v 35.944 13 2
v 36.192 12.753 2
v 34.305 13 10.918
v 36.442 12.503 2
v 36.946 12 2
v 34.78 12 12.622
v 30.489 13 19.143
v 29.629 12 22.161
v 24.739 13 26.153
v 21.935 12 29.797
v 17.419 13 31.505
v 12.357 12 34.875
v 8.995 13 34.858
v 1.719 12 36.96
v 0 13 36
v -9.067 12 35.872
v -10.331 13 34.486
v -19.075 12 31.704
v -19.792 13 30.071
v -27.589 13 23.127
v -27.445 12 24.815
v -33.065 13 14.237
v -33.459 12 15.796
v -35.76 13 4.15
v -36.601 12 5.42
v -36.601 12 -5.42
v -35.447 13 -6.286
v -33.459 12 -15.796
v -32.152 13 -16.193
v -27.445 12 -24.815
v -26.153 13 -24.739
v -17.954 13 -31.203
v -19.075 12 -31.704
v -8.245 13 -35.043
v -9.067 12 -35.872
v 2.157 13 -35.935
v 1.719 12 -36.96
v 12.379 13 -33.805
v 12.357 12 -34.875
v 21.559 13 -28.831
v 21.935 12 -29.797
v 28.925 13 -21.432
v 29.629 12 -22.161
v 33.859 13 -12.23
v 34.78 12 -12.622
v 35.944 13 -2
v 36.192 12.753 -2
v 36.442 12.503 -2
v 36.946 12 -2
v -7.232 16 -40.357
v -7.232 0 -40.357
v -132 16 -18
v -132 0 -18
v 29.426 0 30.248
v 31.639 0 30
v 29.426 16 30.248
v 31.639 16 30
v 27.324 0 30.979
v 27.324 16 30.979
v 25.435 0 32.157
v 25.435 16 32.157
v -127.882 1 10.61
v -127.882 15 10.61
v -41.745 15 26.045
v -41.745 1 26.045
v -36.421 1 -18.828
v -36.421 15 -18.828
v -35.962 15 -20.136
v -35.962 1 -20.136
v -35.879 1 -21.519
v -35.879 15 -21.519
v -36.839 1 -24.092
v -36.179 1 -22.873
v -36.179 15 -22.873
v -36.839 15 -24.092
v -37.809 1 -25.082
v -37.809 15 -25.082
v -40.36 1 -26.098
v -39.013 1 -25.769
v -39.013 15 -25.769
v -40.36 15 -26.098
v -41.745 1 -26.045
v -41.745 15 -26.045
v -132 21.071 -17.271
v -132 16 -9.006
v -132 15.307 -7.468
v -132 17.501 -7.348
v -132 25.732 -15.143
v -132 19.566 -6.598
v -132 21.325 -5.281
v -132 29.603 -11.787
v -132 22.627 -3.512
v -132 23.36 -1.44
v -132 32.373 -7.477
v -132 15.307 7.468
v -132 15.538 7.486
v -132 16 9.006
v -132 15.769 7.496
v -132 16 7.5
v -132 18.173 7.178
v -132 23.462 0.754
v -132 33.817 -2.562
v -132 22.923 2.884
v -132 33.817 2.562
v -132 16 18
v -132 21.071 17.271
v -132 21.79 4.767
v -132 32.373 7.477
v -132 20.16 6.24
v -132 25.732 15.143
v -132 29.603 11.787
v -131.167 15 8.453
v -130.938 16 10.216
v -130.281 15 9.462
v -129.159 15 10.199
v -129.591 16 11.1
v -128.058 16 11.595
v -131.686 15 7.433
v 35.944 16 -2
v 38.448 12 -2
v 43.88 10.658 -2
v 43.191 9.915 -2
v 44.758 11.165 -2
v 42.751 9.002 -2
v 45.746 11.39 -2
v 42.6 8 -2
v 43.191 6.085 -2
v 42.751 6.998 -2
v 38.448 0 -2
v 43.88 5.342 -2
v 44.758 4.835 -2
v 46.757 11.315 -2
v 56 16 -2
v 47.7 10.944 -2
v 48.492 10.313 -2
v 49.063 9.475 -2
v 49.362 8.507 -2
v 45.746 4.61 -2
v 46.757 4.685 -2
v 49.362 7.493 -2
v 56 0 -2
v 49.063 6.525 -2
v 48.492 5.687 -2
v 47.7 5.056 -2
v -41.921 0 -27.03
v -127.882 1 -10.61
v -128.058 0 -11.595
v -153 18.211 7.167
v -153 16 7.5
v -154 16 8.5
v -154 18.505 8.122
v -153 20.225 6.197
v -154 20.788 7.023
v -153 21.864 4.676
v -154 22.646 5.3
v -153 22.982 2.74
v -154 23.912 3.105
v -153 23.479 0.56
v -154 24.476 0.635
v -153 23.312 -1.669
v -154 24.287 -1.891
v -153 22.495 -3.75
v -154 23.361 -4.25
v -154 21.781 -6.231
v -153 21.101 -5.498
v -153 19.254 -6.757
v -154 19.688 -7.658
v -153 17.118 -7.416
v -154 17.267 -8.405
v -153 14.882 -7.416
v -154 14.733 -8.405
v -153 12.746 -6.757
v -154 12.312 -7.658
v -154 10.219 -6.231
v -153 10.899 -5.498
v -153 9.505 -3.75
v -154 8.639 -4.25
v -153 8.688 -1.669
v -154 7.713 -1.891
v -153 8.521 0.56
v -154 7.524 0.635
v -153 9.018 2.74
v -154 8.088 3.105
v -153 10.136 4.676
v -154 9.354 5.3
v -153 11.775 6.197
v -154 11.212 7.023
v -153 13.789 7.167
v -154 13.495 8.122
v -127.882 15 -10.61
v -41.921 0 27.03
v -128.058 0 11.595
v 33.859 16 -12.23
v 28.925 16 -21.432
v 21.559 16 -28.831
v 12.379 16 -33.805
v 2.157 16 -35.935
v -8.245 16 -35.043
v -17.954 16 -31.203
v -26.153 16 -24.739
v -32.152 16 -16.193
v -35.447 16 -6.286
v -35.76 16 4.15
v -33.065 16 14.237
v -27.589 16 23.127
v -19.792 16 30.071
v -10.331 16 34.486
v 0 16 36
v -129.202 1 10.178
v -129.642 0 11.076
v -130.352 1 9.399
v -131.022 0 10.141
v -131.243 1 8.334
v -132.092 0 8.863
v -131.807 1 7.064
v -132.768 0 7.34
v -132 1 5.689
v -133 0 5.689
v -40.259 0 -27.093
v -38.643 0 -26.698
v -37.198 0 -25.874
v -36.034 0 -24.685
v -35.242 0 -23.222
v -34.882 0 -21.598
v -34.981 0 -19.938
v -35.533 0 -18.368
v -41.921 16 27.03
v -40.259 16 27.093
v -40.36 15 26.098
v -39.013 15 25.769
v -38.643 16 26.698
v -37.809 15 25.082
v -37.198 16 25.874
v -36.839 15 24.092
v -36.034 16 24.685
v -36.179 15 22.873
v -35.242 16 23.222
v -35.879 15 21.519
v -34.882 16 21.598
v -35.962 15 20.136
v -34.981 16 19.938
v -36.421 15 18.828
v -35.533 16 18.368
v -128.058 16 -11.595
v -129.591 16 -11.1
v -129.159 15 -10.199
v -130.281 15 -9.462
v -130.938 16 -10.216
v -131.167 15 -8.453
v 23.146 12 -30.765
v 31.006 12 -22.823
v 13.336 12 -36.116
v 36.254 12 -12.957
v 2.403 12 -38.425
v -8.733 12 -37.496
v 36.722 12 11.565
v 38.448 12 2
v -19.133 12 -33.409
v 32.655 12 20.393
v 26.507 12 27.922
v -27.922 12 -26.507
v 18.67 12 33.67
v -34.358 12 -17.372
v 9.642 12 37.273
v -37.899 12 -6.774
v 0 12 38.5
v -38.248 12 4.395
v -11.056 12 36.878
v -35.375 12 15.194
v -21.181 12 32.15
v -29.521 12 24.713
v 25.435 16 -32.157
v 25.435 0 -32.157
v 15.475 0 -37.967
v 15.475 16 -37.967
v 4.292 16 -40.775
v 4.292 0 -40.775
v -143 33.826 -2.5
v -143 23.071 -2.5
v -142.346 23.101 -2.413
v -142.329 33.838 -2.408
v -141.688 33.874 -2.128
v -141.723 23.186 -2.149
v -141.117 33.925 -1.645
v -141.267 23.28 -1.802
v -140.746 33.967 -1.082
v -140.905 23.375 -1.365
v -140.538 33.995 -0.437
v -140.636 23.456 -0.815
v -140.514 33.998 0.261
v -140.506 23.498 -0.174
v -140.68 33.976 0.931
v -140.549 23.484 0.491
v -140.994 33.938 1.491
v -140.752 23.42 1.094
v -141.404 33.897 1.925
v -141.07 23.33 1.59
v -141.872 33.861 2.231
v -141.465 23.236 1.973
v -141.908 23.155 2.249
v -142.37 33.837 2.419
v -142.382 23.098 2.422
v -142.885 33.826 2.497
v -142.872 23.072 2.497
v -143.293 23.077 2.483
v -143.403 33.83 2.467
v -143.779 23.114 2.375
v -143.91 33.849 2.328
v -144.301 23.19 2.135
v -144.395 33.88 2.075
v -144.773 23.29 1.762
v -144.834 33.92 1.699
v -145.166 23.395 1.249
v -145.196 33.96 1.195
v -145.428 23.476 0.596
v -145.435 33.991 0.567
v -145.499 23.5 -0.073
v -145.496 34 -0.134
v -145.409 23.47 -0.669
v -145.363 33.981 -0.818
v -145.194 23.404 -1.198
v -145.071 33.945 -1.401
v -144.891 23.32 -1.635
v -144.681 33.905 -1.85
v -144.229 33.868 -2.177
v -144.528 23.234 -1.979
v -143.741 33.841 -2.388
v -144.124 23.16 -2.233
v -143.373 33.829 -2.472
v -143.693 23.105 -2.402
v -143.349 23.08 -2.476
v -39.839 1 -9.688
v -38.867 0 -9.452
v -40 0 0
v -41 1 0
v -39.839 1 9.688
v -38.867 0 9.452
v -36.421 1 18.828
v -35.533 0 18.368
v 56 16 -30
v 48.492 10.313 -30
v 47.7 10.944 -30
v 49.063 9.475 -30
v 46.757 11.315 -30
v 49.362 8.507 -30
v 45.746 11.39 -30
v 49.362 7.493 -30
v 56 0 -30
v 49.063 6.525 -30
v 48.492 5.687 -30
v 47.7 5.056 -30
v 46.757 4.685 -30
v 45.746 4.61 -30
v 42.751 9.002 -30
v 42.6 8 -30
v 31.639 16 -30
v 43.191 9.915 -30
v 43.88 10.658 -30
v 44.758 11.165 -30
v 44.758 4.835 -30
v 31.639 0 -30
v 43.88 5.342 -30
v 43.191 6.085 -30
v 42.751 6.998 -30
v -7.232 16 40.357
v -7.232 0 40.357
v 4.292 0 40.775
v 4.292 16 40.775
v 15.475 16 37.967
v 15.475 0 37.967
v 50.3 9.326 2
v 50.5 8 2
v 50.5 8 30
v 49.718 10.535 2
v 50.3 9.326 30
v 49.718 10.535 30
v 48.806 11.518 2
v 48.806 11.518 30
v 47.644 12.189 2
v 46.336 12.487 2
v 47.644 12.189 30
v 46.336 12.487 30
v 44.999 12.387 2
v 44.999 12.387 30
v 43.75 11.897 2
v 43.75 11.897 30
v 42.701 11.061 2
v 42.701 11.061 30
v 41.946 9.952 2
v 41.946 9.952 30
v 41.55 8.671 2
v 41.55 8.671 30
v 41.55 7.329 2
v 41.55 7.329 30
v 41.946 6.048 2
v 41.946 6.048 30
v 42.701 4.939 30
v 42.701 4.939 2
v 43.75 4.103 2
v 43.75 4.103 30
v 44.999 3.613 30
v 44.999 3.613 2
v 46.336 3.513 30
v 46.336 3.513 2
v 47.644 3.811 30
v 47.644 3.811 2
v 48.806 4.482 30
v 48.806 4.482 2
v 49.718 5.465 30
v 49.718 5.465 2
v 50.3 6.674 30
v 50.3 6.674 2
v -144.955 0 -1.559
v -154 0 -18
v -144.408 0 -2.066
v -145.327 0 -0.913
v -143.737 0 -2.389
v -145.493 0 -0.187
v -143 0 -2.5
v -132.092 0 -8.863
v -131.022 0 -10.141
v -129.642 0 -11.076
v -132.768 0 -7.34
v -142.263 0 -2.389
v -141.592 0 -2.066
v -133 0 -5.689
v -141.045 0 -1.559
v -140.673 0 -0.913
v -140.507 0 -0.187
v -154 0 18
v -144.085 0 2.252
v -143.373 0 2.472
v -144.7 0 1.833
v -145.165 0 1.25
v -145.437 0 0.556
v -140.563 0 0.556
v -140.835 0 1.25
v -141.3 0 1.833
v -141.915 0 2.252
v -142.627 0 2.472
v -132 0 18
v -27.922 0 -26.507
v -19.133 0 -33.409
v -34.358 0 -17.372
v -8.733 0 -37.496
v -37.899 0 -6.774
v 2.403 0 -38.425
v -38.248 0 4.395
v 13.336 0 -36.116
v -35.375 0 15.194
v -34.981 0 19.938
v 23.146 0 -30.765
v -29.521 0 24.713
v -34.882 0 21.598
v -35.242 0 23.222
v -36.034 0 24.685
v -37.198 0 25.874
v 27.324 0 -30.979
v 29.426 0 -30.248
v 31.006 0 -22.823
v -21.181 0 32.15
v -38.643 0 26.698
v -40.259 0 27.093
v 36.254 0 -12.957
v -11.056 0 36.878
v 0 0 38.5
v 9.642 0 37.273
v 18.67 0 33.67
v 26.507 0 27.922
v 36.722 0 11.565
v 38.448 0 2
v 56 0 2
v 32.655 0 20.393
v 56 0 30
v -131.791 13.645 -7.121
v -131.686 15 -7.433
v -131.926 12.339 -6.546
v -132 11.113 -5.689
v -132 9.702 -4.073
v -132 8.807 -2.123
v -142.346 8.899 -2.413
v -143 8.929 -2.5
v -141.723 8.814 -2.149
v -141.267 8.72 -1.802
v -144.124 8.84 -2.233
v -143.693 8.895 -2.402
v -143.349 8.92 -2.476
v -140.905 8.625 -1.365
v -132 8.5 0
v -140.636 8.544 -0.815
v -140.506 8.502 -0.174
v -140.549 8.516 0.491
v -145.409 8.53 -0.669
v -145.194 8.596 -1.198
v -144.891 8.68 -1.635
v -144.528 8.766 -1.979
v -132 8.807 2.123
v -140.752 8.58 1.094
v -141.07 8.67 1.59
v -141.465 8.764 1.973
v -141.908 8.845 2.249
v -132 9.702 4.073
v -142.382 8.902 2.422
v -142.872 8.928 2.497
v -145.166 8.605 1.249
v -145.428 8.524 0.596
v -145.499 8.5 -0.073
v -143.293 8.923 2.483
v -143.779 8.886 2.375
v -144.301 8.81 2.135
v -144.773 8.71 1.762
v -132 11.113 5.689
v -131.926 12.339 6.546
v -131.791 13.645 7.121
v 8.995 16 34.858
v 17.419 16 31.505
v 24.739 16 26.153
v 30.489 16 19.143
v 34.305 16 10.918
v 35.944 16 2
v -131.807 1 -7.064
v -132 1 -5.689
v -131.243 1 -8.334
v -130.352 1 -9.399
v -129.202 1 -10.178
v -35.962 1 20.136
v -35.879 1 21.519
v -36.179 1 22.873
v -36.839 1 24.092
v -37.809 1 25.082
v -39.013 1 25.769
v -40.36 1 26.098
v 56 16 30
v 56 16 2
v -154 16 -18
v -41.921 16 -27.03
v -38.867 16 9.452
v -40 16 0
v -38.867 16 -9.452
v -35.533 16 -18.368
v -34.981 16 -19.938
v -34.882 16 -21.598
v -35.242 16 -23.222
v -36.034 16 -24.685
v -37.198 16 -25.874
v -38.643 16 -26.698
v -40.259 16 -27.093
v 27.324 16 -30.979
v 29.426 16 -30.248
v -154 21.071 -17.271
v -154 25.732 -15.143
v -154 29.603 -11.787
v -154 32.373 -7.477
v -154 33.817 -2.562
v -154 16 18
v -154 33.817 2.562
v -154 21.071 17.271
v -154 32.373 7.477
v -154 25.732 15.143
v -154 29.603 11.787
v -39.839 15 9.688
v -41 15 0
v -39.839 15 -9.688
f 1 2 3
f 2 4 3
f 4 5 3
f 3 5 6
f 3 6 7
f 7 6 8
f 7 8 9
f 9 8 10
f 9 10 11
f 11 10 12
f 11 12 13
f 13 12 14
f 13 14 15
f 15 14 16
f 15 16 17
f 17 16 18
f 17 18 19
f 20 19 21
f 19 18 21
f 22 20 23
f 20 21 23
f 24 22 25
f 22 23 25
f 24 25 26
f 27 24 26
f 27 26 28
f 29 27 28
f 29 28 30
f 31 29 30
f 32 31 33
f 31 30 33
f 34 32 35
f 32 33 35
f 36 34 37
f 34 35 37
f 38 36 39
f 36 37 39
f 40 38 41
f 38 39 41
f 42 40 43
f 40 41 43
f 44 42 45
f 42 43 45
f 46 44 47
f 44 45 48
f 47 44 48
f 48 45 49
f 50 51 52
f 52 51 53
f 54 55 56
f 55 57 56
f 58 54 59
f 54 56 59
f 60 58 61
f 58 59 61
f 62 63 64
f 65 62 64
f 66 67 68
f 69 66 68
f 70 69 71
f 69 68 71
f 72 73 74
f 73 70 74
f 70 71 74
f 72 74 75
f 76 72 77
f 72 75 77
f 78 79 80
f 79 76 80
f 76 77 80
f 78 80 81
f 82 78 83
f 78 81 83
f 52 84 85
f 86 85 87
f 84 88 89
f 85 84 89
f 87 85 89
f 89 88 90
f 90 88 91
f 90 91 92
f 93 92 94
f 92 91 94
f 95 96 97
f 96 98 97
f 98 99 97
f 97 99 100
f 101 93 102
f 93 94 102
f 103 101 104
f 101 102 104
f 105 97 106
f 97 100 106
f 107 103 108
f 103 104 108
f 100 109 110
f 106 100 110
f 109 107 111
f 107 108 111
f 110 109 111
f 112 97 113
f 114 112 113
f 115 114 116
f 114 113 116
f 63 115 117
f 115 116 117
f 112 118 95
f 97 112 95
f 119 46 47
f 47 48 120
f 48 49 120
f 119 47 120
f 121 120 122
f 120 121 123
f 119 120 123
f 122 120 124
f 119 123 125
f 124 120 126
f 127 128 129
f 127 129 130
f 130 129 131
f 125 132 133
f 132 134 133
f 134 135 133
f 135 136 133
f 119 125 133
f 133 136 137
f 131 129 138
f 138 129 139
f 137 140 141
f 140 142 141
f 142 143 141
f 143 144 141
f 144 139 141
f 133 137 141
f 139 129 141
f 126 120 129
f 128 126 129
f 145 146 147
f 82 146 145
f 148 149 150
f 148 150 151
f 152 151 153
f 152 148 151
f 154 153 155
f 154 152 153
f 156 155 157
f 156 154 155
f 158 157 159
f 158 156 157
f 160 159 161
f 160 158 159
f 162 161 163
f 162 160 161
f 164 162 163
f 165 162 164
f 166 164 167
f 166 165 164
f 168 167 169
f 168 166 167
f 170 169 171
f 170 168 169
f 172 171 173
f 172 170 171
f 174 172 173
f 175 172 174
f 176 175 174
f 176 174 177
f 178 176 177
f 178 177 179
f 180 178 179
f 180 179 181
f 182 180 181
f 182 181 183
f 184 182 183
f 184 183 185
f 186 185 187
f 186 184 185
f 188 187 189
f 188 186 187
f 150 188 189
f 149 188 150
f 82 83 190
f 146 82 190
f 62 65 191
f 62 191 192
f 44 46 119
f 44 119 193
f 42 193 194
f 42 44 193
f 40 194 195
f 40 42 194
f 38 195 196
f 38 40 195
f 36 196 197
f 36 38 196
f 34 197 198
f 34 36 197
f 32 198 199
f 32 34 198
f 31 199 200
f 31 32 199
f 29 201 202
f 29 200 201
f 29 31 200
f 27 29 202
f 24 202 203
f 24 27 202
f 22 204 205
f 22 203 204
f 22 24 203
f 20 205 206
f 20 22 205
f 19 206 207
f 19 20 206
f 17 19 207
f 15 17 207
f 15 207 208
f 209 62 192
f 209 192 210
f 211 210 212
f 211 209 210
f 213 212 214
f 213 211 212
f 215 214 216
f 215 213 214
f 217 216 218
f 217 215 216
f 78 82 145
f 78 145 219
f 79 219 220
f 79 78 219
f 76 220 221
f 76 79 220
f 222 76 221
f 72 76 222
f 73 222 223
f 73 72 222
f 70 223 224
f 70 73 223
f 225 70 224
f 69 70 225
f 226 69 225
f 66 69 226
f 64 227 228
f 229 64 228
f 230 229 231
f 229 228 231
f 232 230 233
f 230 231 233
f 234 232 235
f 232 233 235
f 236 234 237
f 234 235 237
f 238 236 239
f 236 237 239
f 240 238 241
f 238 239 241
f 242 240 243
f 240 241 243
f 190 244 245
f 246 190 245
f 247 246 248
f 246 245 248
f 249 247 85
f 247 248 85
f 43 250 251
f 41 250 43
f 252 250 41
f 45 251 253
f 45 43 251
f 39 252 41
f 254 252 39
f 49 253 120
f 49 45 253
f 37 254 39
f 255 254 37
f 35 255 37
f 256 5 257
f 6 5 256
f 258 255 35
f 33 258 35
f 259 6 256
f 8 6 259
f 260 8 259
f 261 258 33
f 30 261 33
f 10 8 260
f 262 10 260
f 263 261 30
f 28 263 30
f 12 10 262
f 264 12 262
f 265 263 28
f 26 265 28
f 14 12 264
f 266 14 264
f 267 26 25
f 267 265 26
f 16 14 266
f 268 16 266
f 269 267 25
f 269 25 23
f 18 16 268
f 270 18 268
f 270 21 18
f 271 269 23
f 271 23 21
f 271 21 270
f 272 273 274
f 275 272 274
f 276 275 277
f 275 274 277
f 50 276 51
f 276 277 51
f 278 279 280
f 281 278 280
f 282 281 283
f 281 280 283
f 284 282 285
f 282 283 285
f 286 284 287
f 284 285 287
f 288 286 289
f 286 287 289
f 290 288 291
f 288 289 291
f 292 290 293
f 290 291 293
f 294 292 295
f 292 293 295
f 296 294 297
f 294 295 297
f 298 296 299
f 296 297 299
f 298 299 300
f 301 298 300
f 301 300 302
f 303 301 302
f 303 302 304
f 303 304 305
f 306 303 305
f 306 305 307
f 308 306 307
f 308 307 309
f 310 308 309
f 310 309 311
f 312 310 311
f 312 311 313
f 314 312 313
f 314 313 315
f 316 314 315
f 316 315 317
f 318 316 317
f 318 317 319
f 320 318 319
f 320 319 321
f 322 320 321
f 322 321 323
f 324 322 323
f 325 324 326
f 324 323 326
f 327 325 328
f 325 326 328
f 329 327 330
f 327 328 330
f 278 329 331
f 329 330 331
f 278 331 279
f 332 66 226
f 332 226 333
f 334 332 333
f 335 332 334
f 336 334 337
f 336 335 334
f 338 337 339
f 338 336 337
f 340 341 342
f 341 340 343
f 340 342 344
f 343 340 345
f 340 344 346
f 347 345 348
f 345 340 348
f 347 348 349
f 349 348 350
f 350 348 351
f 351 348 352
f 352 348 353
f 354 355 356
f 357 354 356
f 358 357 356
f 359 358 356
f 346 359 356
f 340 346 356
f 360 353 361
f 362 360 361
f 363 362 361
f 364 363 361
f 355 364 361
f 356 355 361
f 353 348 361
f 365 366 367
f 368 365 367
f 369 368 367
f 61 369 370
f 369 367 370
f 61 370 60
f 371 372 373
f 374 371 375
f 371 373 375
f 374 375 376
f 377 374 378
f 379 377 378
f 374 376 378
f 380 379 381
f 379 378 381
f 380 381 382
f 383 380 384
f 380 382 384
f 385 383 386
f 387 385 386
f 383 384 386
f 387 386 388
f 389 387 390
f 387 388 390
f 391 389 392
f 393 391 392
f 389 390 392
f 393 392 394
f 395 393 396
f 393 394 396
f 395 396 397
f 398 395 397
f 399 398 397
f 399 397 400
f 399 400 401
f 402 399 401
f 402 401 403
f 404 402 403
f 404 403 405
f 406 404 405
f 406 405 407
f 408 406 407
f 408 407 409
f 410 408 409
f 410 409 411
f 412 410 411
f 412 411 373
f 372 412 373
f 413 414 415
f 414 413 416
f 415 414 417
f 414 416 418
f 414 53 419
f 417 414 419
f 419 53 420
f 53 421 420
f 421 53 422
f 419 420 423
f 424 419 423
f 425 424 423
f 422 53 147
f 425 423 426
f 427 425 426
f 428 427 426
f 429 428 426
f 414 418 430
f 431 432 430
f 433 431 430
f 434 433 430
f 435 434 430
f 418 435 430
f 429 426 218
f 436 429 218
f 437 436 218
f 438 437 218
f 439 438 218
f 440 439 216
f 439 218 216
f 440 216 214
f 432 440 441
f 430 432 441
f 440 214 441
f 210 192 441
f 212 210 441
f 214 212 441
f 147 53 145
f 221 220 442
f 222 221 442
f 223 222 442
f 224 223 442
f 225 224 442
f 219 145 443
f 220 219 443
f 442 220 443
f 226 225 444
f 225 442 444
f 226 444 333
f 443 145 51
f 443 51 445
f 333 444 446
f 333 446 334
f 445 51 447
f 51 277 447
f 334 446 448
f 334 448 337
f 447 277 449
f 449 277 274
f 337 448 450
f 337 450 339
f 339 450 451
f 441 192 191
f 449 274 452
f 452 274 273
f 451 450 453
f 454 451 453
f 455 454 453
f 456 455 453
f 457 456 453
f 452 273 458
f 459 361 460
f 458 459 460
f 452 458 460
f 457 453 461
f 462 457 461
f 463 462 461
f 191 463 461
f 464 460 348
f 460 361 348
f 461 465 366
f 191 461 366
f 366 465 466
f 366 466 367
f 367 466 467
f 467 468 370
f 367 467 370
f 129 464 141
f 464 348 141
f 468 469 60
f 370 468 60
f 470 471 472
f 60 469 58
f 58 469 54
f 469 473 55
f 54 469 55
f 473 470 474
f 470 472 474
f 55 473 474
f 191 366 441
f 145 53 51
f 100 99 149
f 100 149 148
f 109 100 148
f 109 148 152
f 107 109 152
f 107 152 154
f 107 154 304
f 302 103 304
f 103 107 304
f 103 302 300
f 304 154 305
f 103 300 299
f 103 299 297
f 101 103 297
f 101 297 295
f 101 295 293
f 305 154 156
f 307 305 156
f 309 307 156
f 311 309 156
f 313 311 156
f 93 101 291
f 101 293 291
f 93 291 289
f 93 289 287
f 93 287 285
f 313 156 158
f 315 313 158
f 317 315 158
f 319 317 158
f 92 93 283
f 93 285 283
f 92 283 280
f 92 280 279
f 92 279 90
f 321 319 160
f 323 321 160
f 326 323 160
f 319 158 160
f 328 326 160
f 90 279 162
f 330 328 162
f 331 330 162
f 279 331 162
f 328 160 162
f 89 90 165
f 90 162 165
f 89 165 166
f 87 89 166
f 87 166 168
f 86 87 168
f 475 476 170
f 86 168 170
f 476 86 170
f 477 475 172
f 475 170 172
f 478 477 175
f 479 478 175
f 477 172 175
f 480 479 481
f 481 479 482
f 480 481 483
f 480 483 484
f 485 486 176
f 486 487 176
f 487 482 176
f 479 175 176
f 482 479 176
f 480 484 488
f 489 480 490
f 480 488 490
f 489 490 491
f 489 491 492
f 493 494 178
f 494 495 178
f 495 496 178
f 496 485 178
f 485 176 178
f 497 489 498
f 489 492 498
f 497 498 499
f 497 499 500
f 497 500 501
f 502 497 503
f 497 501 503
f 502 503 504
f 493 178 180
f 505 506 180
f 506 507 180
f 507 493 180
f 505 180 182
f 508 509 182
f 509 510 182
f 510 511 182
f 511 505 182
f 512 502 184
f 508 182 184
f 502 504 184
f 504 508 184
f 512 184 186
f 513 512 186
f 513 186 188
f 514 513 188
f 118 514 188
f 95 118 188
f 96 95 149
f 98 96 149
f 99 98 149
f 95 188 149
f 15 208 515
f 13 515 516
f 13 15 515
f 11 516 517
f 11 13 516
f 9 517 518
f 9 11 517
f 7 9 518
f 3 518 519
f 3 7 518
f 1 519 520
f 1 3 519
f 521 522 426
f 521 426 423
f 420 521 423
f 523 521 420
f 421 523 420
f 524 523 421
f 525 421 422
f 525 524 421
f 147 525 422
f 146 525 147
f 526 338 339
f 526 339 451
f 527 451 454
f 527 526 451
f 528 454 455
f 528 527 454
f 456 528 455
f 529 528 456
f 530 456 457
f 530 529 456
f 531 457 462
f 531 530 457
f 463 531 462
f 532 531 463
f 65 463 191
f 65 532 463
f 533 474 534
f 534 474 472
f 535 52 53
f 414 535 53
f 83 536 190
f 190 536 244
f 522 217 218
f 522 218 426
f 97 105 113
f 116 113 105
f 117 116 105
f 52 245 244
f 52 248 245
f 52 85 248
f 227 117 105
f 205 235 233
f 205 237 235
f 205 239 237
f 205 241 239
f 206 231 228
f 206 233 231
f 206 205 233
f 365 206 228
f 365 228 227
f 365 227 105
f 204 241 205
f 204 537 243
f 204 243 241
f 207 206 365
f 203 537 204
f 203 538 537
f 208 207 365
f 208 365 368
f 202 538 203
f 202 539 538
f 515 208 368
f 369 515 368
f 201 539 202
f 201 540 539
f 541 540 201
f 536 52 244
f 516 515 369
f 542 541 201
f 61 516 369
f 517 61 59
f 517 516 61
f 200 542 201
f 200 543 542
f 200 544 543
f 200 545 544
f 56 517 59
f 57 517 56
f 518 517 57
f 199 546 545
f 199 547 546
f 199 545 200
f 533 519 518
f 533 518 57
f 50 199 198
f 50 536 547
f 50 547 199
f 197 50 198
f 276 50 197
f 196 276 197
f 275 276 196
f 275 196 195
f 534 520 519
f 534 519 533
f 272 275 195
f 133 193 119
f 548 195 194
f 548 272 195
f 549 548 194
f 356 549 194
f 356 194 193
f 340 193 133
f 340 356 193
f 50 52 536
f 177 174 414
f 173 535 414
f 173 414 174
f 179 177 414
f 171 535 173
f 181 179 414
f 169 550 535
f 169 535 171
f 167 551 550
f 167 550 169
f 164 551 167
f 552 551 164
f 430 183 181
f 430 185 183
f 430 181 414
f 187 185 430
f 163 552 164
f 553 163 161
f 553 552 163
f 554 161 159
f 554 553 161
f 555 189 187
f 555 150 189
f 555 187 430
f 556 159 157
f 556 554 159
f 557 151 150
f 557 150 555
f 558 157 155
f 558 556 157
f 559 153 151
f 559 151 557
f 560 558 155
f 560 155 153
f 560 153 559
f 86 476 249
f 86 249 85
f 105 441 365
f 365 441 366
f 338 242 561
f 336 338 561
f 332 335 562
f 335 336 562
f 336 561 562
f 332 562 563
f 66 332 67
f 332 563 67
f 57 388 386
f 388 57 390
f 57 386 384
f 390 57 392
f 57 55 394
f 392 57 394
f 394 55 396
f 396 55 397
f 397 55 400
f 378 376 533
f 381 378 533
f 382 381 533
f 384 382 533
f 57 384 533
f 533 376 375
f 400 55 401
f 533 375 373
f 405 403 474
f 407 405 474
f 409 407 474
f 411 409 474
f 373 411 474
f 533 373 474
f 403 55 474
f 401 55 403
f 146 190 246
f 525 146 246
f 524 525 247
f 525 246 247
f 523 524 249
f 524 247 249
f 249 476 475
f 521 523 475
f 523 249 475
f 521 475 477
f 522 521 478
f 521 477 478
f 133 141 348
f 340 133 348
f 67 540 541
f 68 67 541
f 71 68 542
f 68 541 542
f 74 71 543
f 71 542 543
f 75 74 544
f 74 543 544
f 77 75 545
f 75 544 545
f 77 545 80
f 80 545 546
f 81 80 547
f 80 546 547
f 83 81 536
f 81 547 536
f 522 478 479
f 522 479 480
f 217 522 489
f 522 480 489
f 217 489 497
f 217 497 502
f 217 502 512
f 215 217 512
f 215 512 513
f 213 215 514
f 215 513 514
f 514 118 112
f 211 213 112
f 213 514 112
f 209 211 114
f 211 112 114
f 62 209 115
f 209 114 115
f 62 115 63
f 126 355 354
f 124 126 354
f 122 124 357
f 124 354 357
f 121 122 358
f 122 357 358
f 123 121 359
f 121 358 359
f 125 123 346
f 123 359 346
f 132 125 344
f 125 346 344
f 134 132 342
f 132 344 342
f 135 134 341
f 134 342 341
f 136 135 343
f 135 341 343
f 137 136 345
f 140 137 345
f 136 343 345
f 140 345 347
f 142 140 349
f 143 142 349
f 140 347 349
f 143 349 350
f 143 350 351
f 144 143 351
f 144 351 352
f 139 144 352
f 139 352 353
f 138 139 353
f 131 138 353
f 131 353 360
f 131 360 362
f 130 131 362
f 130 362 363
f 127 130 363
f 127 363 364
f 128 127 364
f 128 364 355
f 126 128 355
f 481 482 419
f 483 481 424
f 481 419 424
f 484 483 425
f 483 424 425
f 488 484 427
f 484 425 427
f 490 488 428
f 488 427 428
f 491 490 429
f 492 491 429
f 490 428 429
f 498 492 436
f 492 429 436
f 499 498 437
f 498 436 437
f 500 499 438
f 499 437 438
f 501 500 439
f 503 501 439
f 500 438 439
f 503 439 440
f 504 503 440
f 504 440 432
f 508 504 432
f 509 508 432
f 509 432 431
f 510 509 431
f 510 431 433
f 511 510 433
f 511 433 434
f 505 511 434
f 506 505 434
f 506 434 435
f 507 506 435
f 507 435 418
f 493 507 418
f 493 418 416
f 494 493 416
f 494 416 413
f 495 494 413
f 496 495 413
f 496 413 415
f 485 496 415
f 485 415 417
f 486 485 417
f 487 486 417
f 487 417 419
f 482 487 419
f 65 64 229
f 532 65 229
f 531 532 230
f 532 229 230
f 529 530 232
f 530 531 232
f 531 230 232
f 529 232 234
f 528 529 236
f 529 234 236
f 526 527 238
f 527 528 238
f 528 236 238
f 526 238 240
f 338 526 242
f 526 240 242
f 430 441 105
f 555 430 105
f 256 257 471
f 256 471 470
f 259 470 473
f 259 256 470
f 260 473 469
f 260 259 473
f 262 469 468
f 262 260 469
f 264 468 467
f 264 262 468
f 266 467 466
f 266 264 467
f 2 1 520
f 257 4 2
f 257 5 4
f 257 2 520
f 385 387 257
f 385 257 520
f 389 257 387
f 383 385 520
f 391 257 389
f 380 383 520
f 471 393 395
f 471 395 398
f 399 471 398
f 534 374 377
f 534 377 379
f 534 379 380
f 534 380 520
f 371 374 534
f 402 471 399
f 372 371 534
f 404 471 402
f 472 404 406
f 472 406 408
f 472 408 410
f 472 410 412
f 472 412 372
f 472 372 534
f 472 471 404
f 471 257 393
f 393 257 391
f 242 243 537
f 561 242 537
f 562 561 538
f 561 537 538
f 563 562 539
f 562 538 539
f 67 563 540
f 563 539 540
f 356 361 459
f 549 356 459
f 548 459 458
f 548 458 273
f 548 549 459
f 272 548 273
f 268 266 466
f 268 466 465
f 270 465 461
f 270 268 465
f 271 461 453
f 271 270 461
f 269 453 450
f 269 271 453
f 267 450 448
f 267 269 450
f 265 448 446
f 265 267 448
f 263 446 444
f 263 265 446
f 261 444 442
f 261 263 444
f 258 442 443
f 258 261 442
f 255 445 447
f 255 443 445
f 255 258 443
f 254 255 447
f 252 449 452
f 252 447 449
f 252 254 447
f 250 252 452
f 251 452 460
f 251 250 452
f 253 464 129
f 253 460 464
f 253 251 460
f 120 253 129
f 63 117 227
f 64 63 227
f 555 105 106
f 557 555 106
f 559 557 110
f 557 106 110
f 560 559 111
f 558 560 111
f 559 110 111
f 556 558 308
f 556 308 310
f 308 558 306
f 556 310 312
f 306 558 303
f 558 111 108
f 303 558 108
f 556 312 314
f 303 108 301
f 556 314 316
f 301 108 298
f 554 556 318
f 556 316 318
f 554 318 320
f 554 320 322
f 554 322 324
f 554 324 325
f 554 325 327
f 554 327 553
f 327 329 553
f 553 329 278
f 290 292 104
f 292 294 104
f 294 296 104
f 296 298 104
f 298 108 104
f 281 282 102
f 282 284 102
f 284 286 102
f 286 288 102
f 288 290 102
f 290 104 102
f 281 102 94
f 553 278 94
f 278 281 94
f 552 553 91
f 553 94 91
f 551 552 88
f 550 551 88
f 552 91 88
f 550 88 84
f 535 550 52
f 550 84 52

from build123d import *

# Parameters (mm, degrees)
EXTRUDE_1_DEPTH            = 16
CUT_EXTRUDE_1_DEPTH        = 140.143810498
CUT_EXTRUDE_1_DEPTH_BACK   = 140.143810498
SKETCH_2_R                 = 36
CUT_EXTRUDE_2_DEPTH        = 140.143810498
CUT_EXTRUDE_2_DEPTH_BACK   = 12
SKETCH_3_R                 = 38.5
CUT_EXTRUDE_1_2_DEPTH      = 140.143810498
CUT_EXTRUDE_1_2_DEPTH_BACK = 140.143810498
SKETCH_4_W                 = 46.223763545
SKETCH_4_H                 = 4
CUT_EXTRUDE_3_REACH        = 152.735
SKETCH_5_R                 = 4.5
HOLE_WIZARD_M8_1_D         = 6.8
FILLET_1_R                 = 10
EXTRUDE_2_DEPTH            = 22
CUT_EXTRUDE_4_REACH        = 162.378
CHAMFER_1_SIZE             = 1
CHAMFER_2_SIZE             = 1
CUT_EXTRUDE_5_REACH        = 218.649
SKETCH_12_R                = 7.5
F_5_0MM_1_D                = 5
CHAMFER_3_SIZE             = 1


with BuildPart() as part:
    # 草图1 → 凸台-拉伸1 (new body)
    with BuildSketch(Plane(origin=(0, 0, 0), x_dir=(1, 0, 0), z_dir=(0, 1, 0))):
        with BuildLine():
            Line((56, 30), (27.946377225, 30))
            ThreePointArc((27.946377225, 30), (11.579874692, 39.330732286), (-7.231593148, 40.357205807))
            Line((-7.231593148, 40.357205807), (-132, 18))
            Line((-132, 18), (-132, -18))
            Line((-132, -18), (-7.231593148, -40.357205807))
            ThreePointArc((-7.231593148, -40.357205807), (11.579874692, -39.330732286), (27.946377225, -30))
            Line((27.946377225, -30), (56, -30))
            Line((56, -30), (56, 30))
        make_face()
    extrude(amount=EXTRUDE_1_DEPTH)

    # 草图2 → Cut-Extrude 1 (cut, two sides: drawn at the far end of the back side and taken through both)
    with BuildSketch(Plane(origin=(0, 16, 0), x_dir=(1, 0, 0), z_dir=(0, 1, 0)).offset(-CUT_EXTRUDE_1_DEPTH_BACK)):
        with Locations(Location((0, 0, 0), (0, 0, 270))):
            Circle(SKETCH_2_R)
    extrude(amount=CUT_EXTRUDE_1_DEPTH + CUT_EXTRUDE_1_DEPTH_BACK, mode=Mode.SUBTRACT)

    # 草图3 → 切除-拉伸2 (cut, two sides: drawn at the far end of the back side and taken through both)
    with BuildSketch(Plane.XZ.offset(-CUT_EXTRUDE_2_DEPTH_BACK)):
        with Locations(Location((0, 0, 0), (0, 0, 90))):
            Circle(SKETCH_3_R)
    extrude(amount=CUT_EXTRUDE_2_DEPTH + CUT_EXTRUDE_2_DEPTH_BACK, mode=Mode.SUBTRACT)

    # 草图4 → Cut-Extrude 1 2 (cut, two sides: drawn at the far end of the back side and taken through both)
    with BuildSketch(Plane(origin=(0, 16, 0), x_dir=(1, 0, 0), z_dir=(0, 1, 0)).offset(-CUT_EXTRUDE_1_2_DEPTH_BACK)):
        with Locations((51.058258998, 0)):
            Rectangle(SKETCH_4_W, SKETCH_4_H)
    extrude(amount=CUT_EXTRUDE_1_2_DEPTH + CUT_EXTRUDE_1_2_DEPTH_BACK, mode=Mode.SUBTRACT)

    # 草图5 → 切除-拉伸3 (cut, up to next)
    with BuildSketch(Plane.XY.offset(30), mode=Mode.PRIVATE) as cut_extrude_3_sk1:
        with Locations((46, 8)):
            Circle(SKETCH_5_R)
    cut_extrude_3_tool1 = extrude(cut_extrude_3_sk1.sketch, amount=-CUT_EXTRUDE_3_REACH, mode=Mode.PRIVATE) & part.part
    add(cut_extrude_3_tool1.solids().sort_by_distance((46, 8, 30))[0], mode=Mode.SUBTRACT)

    # M8 螺纹孔1 (through all)
    with Locations(Plane.XY.offset(-2)):
        with Locations((46, 8)):
            Hole(HOLE_WIZARD_M8_1_D / 2)

    # 圆角1
    fillet_1_edges = [part.edges().sort_by_distance(p)[0] for p in [
        (27.946377225, 8, 30),
        (27.946377225, 8, -30),
    ]]
    fillet(fillet_1_edges, radius=FILLET_1_R)

    # 草图11 → 凸台-拉伸2 (add)
    with BuildSketch(Plane.ZY.offset(132)):
        with BuildLine():
            Line((-18, 0), (18, 0))
            Line((18, 0), (18, 16))
            ThreePointArc((18, 16), (0, 34), (-18, 16))
            Line((-18, 16), (-18, 0))
        make_face()
    extrude(amount=EXTRUDE_2_DEPTH)

    # 草图13 → 切除-拉伸4 (cut, up to next)
    with BuildSketch(Plane(origin=(0, 16, 0), x_dir=(1, 0, 0), z_dir=(0, 1, 0)), mode=Mode.PRIVATE) as cut_extrude_4_sk1:
        with BuildLine():
            Line((-41.744935847, 26.04535143), (-127.881901603, 10.610499615))
            ThreePointArc((-127.881901603, 10.610499615), (-130.834677823, 8.897509725), (-132, 5.688889151))
            Line((-132, 5.688889151), (-132, -5.688889151))
            ThreePointArc((-132, -5.688889151), (-130.834677823, -8.897509725), (-127.881901603, -10.610499615))
            Line((-127.881901603, -10.610499615), (-41.744935847, -26.04535143))
            ThreePointArc((-41.744935847, -26.04535143), (-36.839154105, -24.091633928), (-36.421400087, -18.827682165))
            ThreePointArc((-36.421400087, -18.827682165), (-41, 0), (-36.421400087, 18.827682165))
            ThreePointArc((-36.421400087, 18.827682165), (-36.839154105, 24.091633928), (-41.744935847, 26.04535143))
        make_face()
    cut_extrude_4_tool1 = extrude(cut_extrude_4_sk1.sketch, amount=-CUT_EXTRUDE_4_REACH, mode=Mode.PRIVATE) & part.part
    add(cut_extrude_4_tool1.solids().sort_by_distance((-78.107907, 16, 0))[0], mode=Mode.SUBTRACT)

    # 倒角1
    chamfer_1_edges = [part.edges().sort_by_distance(p)[0] for p in [
        (-130.834677823, 16, -8.897509725),
        (-130.834677823, 16, 8.897509725),
        (-84.813418725, 16, 18.327925523),
        (-36.839154105, 16, 24.091633928),
        (-41, 16, 0),
        (-36.839154105, 16, -24.091633928),
        (-84.813418725, 16, -18.327925523),
        (-132, 0, 0),
        (-130.834677823, 0, -8.897509725),
        (-84.813418725, 0, -18.327925523),
        (-36.839154105, 0, -24.091633928),
        (-41, 0, 0),
        (-36.839154105, 0, 24.091633928),
        (-84.813418725, 0, 18.327925523),
        (-130.834677823, 0, 8.897509725),
    ]]
    chamfer(chamfer_1_edges, length=CHAMFER_1_SIZE)

    # 倒角2
    chamfer_2_edges = [part.edges().sort_by_distance(p)[0] for p in [
        (-26.153393661, 12, -24.738633754),
    ]]
    chamfer(chamfer_2_edges, length=CHAMFER_2_SIZE)

    # 草图12 → 切除-拉伸5 (cut, up to next)
    with BuildSketch(Plane.ZY.offset(154), mode=Mode.PRIVATE) as cut_extrude_5_sk1:
        with Locations((0, 16)):
            Circle(SKETCH_12_R)
    cut_extrude_5_tool1 = extrude(cut_extrude_5_sk1.sketch, amount=-CUT_EXTRUDE_5_REACH, mode=Mode.PRIVATE) & part.part
    add(cut_extrude_5_tool1.solids().sort_by_distance((-154, 16, 0))[0], mode=Mode.SUBTRACT)

    # Ø5.0mm 暗销孔1 (through all)
    with Locations(Plane(origin=(-143, 34, 0), x_dir=(0, 0, 1), z_dir=(0, 1, 0))):
        with Locations((0, 0)):
            Hole(F_5_0MM_1_D / 2)

    # 倒角3
    chamfer_3_edges = [part.edges().sort_by_distance(p)[0] for p in [
        (-154, 16, -7.5),
    ]]
    chamfer(chamfer_3_edges, length=CHAMFER_3_SIZE)


solid = part.part
